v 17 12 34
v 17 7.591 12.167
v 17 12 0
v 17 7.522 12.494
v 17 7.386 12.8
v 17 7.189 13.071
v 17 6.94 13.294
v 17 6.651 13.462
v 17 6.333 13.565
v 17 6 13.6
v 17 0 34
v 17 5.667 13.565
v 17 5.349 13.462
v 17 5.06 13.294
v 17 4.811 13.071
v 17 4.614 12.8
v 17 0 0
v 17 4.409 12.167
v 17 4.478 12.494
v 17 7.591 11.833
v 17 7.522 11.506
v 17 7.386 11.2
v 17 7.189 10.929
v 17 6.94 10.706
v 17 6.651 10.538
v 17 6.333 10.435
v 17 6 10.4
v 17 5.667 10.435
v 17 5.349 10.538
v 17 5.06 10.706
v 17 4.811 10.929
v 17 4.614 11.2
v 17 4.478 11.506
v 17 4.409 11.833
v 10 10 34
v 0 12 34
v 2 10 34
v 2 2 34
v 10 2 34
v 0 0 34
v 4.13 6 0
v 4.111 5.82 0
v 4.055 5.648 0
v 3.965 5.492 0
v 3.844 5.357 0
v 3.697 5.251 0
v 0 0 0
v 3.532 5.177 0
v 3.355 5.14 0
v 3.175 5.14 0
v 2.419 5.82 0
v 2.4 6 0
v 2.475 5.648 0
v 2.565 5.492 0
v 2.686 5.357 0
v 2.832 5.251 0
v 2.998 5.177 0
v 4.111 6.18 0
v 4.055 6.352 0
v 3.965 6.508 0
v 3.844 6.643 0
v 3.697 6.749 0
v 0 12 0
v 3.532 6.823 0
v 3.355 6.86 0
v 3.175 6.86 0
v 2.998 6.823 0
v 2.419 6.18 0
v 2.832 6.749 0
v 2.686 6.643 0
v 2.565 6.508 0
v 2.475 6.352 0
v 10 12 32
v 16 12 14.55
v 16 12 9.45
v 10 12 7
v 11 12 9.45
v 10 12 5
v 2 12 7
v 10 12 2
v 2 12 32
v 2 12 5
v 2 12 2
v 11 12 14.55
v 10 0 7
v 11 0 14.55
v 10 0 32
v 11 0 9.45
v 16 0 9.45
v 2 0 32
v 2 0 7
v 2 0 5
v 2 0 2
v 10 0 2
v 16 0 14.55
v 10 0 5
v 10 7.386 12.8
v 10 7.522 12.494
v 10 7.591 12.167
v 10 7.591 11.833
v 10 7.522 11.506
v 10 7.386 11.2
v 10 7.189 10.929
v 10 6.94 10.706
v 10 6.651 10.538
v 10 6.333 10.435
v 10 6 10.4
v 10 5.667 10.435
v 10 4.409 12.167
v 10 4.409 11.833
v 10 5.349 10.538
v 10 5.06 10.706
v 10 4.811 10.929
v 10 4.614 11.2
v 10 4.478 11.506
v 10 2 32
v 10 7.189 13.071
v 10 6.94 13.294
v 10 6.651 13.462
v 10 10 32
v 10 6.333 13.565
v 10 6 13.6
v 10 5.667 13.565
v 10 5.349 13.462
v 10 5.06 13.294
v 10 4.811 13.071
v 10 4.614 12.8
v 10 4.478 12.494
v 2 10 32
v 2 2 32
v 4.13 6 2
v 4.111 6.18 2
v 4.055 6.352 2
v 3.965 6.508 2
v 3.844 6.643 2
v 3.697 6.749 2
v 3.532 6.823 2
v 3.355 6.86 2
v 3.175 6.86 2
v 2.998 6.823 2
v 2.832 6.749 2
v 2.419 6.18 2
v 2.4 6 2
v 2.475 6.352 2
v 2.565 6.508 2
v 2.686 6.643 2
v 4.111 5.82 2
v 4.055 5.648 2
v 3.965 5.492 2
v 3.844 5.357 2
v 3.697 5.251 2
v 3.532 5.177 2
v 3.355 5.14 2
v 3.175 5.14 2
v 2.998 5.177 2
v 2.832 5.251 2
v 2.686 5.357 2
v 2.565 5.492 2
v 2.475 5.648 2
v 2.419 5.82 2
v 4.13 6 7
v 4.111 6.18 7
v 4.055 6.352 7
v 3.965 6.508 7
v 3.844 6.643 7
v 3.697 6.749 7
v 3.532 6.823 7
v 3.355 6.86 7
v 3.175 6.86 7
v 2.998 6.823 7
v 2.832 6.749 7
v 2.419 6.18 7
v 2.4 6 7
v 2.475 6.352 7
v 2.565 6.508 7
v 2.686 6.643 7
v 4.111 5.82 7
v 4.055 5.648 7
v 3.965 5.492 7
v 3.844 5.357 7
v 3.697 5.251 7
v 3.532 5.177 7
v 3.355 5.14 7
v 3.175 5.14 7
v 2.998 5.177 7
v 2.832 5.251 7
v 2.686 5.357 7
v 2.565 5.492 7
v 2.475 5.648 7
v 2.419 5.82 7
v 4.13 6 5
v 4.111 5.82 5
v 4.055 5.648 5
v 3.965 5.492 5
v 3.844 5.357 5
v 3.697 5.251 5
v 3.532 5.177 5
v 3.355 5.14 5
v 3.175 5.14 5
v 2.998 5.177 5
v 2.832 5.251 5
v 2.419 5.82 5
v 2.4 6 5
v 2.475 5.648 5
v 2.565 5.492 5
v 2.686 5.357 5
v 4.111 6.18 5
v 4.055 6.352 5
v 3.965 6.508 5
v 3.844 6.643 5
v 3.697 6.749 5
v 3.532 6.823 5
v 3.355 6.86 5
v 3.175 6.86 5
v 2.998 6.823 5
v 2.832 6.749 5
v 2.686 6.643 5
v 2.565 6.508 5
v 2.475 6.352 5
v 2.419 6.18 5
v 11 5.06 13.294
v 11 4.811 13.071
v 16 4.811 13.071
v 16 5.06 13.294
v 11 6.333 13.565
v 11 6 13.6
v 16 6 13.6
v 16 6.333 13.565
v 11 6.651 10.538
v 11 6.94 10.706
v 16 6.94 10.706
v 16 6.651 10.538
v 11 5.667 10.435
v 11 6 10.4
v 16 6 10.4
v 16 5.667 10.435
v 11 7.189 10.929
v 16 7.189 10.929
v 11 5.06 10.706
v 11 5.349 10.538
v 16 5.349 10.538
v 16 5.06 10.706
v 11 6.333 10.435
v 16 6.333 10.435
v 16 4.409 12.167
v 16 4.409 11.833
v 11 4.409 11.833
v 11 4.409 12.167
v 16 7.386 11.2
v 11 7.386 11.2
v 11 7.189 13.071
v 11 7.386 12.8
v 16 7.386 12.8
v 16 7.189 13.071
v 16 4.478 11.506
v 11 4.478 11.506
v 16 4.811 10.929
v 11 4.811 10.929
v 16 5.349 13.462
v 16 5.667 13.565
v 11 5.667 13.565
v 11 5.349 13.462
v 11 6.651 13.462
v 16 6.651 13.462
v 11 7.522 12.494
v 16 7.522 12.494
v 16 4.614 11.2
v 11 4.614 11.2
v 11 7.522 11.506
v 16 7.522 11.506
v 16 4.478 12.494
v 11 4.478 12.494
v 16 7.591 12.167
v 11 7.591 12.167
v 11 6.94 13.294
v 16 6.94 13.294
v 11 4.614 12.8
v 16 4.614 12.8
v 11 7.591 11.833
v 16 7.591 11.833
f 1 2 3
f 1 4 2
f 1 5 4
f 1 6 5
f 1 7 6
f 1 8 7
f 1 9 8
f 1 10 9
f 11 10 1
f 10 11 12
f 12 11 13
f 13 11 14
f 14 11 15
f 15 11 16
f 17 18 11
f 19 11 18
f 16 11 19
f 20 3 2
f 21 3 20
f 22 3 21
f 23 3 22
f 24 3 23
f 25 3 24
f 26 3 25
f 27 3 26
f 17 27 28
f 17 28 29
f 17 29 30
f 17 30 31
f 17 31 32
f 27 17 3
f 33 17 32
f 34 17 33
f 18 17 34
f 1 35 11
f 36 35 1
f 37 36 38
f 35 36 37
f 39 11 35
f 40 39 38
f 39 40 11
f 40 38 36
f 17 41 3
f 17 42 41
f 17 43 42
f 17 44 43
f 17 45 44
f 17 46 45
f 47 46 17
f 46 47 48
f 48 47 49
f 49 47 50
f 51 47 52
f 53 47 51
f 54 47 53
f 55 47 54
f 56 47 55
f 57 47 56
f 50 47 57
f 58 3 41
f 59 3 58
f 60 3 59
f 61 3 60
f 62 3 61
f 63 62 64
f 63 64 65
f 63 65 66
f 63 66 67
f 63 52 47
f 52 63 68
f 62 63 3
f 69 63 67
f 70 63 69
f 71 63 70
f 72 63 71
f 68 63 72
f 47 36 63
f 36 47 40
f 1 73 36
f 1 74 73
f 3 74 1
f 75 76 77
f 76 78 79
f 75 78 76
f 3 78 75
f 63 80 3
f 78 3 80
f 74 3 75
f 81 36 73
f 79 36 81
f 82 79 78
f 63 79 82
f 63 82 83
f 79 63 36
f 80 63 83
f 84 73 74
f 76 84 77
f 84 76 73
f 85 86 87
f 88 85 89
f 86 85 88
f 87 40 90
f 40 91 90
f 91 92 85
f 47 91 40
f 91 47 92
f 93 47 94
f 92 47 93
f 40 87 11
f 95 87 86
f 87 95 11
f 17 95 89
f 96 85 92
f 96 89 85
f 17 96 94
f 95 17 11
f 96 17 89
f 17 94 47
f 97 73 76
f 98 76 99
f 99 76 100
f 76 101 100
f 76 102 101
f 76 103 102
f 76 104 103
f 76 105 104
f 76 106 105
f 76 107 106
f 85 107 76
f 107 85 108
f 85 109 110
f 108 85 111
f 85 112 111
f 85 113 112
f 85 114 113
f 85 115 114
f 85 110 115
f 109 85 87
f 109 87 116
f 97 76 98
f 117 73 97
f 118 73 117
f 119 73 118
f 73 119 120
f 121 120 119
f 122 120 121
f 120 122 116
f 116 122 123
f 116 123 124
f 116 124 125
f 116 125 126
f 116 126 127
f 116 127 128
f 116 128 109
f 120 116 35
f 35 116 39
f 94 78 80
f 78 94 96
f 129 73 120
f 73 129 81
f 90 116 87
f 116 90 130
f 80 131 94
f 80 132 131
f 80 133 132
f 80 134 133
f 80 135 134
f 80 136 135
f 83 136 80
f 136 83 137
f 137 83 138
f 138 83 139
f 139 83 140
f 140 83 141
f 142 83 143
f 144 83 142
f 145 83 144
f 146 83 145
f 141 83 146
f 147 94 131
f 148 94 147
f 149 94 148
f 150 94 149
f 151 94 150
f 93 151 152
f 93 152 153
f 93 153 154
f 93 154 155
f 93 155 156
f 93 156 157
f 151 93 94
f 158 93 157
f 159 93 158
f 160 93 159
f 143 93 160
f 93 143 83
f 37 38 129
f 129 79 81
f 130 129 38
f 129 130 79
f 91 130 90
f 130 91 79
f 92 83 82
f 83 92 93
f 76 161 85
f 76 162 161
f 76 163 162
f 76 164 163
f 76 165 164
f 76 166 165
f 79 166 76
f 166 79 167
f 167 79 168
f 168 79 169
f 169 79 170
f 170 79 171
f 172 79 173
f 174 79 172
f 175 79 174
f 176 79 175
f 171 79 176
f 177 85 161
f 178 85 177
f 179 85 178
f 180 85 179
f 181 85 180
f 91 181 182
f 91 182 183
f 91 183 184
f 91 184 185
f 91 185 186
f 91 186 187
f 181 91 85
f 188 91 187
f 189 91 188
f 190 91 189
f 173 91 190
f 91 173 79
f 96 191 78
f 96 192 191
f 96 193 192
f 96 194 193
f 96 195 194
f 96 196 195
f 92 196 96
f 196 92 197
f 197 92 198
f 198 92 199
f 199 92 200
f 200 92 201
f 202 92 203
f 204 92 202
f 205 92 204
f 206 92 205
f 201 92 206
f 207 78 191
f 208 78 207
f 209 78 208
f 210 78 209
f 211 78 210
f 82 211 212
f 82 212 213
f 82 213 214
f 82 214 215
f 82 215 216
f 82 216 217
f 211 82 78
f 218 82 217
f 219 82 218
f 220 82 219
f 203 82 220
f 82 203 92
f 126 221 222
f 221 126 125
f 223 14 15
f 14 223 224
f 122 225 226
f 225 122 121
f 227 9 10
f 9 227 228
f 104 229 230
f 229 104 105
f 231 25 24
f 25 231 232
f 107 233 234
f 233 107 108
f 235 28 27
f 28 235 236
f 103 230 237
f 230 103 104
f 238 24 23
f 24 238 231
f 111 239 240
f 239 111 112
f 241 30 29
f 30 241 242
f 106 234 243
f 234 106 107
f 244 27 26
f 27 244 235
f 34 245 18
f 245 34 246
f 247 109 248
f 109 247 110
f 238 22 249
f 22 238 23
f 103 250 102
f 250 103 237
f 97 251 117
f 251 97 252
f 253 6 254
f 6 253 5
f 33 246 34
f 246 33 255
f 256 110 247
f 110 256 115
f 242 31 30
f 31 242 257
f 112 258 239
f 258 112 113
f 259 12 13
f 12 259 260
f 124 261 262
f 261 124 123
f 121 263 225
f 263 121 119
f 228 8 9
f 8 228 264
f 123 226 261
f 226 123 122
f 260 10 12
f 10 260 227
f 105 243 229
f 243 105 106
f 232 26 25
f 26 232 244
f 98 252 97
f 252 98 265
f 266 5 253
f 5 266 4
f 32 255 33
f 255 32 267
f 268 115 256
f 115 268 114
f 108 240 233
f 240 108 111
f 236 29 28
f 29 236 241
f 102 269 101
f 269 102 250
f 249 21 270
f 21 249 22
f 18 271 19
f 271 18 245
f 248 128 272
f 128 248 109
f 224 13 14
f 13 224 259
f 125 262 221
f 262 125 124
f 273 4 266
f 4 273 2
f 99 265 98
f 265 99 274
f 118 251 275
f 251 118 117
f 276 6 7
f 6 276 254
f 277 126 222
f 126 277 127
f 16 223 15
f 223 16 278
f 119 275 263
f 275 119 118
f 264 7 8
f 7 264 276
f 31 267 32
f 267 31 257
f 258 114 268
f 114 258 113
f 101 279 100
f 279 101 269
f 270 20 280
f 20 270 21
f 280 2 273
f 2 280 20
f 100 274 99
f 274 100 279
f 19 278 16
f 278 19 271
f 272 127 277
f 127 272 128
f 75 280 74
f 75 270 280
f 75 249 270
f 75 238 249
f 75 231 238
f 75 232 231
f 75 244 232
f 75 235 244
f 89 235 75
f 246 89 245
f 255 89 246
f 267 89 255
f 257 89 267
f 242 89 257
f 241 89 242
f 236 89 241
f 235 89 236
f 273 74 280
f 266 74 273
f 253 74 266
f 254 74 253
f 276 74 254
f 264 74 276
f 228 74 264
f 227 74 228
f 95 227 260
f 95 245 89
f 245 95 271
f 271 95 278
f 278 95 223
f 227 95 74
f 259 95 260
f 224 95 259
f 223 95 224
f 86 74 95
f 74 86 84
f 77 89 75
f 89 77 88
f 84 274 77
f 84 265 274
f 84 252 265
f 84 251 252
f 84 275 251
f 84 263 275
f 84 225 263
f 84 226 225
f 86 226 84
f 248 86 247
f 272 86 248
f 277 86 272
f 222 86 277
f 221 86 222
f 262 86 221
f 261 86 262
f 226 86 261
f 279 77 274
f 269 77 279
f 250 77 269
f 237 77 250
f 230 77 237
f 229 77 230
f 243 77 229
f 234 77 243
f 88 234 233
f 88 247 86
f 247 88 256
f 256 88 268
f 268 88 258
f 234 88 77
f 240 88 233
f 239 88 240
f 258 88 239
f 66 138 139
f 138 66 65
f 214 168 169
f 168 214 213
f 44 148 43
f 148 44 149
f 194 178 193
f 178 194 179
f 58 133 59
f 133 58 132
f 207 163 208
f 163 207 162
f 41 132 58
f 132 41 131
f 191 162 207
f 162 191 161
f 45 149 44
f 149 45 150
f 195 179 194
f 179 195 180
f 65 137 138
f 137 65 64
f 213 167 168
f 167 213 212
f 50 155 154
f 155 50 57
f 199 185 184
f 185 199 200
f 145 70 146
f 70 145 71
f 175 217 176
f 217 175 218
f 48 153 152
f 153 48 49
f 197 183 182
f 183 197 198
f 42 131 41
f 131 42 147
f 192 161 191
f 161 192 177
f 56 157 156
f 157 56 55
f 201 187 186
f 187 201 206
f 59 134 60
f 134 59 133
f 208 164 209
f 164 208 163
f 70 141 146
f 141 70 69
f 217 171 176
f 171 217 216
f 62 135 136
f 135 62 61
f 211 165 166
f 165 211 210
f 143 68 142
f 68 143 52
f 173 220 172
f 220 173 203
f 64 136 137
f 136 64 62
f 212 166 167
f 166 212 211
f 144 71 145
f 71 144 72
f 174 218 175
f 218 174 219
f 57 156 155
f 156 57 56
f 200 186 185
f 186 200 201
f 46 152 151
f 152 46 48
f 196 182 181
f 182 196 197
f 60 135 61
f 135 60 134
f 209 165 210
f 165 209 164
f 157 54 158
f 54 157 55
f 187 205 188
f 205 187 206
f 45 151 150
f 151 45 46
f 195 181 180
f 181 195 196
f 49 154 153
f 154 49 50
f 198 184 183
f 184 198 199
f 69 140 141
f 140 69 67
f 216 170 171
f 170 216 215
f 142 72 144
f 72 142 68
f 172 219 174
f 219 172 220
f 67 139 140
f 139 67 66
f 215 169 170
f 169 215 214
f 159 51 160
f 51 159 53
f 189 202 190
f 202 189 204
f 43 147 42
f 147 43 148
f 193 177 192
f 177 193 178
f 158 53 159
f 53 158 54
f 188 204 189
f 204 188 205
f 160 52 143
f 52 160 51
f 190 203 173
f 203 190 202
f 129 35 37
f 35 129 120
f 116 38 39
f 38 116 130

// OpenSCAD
// file: ring.scad
///////////////////////////////////////
// Module to make rings              //
// aka cylinders with holes in them  //
// ring (hole diameter,              //
//       ring thickness,             //
//       ring height)                //
// developed by AM Chagas 09-2019    //
//      CC-BY-SA 4.0                 //
///////////////////////////////////////

module ring(ringd=10,ringb=5,ringh=2){
    difference(){
        cylinder(d=ringd+ringb,h=ringh);
        translate([0,0,-1]){
            cylinder(d=ringd,h=ringh+2);
        }//endtranslate
    }//end difference
}//end module

//ring(10,10,50);
// main file
///////////////////////////////////////////
// Design for a liking spout to be used  //
// in the behaviour box                  //
//  CC-BY-SA 4.0 20191008                //
//  Andre Maia Chagas                    //
///////////////////////////////////////////

// all dimensions in mm.

//needs the ring.scad file (saved on the same folder)
use <ring.scad>

//// variables /////////////

//needle used as licking spout
needlediameter = 1.53;

//back plate dimensions 
//(the plate that slides on the metal railings)
backpanelx = 70;
backpanely = 48;
backpanelz = 2.5;

supportw=5;

//dimensions for the headport 
//(a "negative" space where the licking spout will be placed)
headportx = 30;
headporty = 20;
headportz = 30;
lickspoutoffset = 5;
//wall thickness
headportwall = 2;


//force sensor dimensions
forcesensord = 18.3;
forcesensorh = 0.8;
forcesensorl = 33; //how long the long part of the sensor
forcesensorw = 8; // wiidth of the long part of the sensor

//infrared led dimensions
irrecd = 3;
irrech = 5;
irledd = 5;
irledh = 9;

//nut & screw infor
screwd = 3.2;
nutd = 5;

/* change this depending on the printer and printer settings
   it is a "tolerance" variable, so holes and fittings can be 
   adjusted.
*/
tol = 0.1;

$fn=30;
//%cube([backpanelx,backpanely,backpanelz]);


//supporting modules
module irholes(){
    rotate([90,0,0]){
        translate([0,0,0]){
            cylinder(d=irledd+2*tol,h=irledh);
        }//end translate
        translate([0,0,-headporty]){    
            cylinder(d=irrecd+2*tol,h=irledh);
        }//end translate
     }//end rotate
}//end module ir holes

module irsupports(){
rotate([90,0,0]){
    translate([0,0,headportwall]){
ring(irledd+2*tol,2,irledh);
    }//end translate
translate([0,0,-headporty+headportwall/2]){    
    ring(irrecd+2*tol,2,irrech);
    }//end translate
}//end rotate
}//end module ir holes



module fsensorholder(){
difference(){
union(){
    cylinder(d=forcesensord+2*tol+headportwall,h=forcesensorh+headportwall/2);
    translate([-4.5,-13,-2]){
        cube([forcesensorw+headportwall,forcesensord+5,forcesensorh+headportwall/2+2]);
    }//end translate
}//end union

union(){
    translate([0,0,forcesensorh/2+headportwall/2]){
        cylinder(d=forcesensord+2*tol,h=forcesensorh);
    }//end translate
    translate([(-forcesensorw+headportwall/2)/2,0,(forcesensorh+headportwall)/2]){
        cube([forcesensorw+2*tol,forcesensorl+headportwall,5]);
    }//end translate
    translate([needlediameter/2,headporty/2+2,needlediameter/4+headportwall/2]){
        rotate([90,0,0]){
            cylinder(d=needlediameter+2*tol,h=55);
        }//end rotate
    }//end translate
}//end union

}//end difference

}//end module



/////////////////////////////
module needlesupport(){
    module mainframe(){
difference(){
cube([nutd+8+2*headportwall,forcesensorw+2*headportwall,30+2*headportwall]);
translate([headportwall,-headportwall,headportwall]){
cube([8,forcesensorw+4*headportwall,30]);
}//end translate
}//end difference
translate([headportwall,0,5]){
cube([8,forcesensorw+2*headportwall,headportwall]);
}//end translate
}//end submodule

difference(){
mainframe();
translate([13.5,(forcesensorw+2*headportwall)/2,12]){
rotate([0,90,0]){    
//%cylinder(d=nutd+2*tol,h=4,$fn=6);
    translate([0,0,-6]){
cylinder(d=screwd,h=12);
}//rotate
}//translate
cube([nutd,nutd+10,nutd+tol],center=true);
}//translate
translate([headportwall+needlediameter/2+tol+forcesensorh/2,(forcesensorw+2*headportwall)/2,-headportwall-1]){
    rotate([0,0,0]){
        cylinder(d=needlediameter+2*tol,h=20);
    }//end rotate
    }//end translate



translate([headportwall,headportwall,10]){
        cube([8,forcesensorw,30]);
        
    }//end translate
    
}//end difference

}//end module




/////////////////////////////
module lickingport(){
//head port
difference(){
cube([headportx,headporty,headportz]);
    
    
union(){    
translate([headportwall,headportwall,headportwall]){
cube([headportx-headportwall*2,headporty-headportwall*2,headportz]);
}//end translate


//needle entry
translate([headportx/5+lickspoutoffset-needlediameter/2,(headporty-headportwall+needlediameter)/2,-35]){
    cylinder(d=3*needlediameter+2*tol,h=50);
    }//end translate
 
    //led side ports
    translate([headportx/5+5,headportwall+2,4*headportz/5]){
        irholes();
    }//end translate
}//end union
}//end difference
///////////////////////

////////////////////////////
    
///////////////////////////
//base plate with round liquid reservoir


difference(){ 
cube([headportx/5,headporty,headportz]);
translate([headportx/5,headporty/2,3*headportz/6]){
    sphere(d=12);
    }//end translate
}//end difference
    
////////////////////////////

translate([headportx/5+5,headportwall+2,4*headportz/5]){
irsupports();
}
}//end licking port


module backpanel(){
difference(){
translate([-(headportx+2*headportwall)/2,-headporty/2-headportwall-1,headportz-headportwall-0.5]){

cube([backpanelx,backpanely,backpanelz]);
    

}
translate([0,0,5]){
cube([headportx,headporty,headportz]);
}//end transalte
}//end difference
}//end module


///////////////////////////
//lickingport();
//backpanel();
///////////////////////////
/*
translate([headportx/5+lickspoutoffset+tol,-headportwall,-(forcesensord+headportwall/2)]){
rotate([0,0,180]){
//fsensorholder();
needlesupport();
}//end rotate
}//end translate
*/

//
needlesupport();
